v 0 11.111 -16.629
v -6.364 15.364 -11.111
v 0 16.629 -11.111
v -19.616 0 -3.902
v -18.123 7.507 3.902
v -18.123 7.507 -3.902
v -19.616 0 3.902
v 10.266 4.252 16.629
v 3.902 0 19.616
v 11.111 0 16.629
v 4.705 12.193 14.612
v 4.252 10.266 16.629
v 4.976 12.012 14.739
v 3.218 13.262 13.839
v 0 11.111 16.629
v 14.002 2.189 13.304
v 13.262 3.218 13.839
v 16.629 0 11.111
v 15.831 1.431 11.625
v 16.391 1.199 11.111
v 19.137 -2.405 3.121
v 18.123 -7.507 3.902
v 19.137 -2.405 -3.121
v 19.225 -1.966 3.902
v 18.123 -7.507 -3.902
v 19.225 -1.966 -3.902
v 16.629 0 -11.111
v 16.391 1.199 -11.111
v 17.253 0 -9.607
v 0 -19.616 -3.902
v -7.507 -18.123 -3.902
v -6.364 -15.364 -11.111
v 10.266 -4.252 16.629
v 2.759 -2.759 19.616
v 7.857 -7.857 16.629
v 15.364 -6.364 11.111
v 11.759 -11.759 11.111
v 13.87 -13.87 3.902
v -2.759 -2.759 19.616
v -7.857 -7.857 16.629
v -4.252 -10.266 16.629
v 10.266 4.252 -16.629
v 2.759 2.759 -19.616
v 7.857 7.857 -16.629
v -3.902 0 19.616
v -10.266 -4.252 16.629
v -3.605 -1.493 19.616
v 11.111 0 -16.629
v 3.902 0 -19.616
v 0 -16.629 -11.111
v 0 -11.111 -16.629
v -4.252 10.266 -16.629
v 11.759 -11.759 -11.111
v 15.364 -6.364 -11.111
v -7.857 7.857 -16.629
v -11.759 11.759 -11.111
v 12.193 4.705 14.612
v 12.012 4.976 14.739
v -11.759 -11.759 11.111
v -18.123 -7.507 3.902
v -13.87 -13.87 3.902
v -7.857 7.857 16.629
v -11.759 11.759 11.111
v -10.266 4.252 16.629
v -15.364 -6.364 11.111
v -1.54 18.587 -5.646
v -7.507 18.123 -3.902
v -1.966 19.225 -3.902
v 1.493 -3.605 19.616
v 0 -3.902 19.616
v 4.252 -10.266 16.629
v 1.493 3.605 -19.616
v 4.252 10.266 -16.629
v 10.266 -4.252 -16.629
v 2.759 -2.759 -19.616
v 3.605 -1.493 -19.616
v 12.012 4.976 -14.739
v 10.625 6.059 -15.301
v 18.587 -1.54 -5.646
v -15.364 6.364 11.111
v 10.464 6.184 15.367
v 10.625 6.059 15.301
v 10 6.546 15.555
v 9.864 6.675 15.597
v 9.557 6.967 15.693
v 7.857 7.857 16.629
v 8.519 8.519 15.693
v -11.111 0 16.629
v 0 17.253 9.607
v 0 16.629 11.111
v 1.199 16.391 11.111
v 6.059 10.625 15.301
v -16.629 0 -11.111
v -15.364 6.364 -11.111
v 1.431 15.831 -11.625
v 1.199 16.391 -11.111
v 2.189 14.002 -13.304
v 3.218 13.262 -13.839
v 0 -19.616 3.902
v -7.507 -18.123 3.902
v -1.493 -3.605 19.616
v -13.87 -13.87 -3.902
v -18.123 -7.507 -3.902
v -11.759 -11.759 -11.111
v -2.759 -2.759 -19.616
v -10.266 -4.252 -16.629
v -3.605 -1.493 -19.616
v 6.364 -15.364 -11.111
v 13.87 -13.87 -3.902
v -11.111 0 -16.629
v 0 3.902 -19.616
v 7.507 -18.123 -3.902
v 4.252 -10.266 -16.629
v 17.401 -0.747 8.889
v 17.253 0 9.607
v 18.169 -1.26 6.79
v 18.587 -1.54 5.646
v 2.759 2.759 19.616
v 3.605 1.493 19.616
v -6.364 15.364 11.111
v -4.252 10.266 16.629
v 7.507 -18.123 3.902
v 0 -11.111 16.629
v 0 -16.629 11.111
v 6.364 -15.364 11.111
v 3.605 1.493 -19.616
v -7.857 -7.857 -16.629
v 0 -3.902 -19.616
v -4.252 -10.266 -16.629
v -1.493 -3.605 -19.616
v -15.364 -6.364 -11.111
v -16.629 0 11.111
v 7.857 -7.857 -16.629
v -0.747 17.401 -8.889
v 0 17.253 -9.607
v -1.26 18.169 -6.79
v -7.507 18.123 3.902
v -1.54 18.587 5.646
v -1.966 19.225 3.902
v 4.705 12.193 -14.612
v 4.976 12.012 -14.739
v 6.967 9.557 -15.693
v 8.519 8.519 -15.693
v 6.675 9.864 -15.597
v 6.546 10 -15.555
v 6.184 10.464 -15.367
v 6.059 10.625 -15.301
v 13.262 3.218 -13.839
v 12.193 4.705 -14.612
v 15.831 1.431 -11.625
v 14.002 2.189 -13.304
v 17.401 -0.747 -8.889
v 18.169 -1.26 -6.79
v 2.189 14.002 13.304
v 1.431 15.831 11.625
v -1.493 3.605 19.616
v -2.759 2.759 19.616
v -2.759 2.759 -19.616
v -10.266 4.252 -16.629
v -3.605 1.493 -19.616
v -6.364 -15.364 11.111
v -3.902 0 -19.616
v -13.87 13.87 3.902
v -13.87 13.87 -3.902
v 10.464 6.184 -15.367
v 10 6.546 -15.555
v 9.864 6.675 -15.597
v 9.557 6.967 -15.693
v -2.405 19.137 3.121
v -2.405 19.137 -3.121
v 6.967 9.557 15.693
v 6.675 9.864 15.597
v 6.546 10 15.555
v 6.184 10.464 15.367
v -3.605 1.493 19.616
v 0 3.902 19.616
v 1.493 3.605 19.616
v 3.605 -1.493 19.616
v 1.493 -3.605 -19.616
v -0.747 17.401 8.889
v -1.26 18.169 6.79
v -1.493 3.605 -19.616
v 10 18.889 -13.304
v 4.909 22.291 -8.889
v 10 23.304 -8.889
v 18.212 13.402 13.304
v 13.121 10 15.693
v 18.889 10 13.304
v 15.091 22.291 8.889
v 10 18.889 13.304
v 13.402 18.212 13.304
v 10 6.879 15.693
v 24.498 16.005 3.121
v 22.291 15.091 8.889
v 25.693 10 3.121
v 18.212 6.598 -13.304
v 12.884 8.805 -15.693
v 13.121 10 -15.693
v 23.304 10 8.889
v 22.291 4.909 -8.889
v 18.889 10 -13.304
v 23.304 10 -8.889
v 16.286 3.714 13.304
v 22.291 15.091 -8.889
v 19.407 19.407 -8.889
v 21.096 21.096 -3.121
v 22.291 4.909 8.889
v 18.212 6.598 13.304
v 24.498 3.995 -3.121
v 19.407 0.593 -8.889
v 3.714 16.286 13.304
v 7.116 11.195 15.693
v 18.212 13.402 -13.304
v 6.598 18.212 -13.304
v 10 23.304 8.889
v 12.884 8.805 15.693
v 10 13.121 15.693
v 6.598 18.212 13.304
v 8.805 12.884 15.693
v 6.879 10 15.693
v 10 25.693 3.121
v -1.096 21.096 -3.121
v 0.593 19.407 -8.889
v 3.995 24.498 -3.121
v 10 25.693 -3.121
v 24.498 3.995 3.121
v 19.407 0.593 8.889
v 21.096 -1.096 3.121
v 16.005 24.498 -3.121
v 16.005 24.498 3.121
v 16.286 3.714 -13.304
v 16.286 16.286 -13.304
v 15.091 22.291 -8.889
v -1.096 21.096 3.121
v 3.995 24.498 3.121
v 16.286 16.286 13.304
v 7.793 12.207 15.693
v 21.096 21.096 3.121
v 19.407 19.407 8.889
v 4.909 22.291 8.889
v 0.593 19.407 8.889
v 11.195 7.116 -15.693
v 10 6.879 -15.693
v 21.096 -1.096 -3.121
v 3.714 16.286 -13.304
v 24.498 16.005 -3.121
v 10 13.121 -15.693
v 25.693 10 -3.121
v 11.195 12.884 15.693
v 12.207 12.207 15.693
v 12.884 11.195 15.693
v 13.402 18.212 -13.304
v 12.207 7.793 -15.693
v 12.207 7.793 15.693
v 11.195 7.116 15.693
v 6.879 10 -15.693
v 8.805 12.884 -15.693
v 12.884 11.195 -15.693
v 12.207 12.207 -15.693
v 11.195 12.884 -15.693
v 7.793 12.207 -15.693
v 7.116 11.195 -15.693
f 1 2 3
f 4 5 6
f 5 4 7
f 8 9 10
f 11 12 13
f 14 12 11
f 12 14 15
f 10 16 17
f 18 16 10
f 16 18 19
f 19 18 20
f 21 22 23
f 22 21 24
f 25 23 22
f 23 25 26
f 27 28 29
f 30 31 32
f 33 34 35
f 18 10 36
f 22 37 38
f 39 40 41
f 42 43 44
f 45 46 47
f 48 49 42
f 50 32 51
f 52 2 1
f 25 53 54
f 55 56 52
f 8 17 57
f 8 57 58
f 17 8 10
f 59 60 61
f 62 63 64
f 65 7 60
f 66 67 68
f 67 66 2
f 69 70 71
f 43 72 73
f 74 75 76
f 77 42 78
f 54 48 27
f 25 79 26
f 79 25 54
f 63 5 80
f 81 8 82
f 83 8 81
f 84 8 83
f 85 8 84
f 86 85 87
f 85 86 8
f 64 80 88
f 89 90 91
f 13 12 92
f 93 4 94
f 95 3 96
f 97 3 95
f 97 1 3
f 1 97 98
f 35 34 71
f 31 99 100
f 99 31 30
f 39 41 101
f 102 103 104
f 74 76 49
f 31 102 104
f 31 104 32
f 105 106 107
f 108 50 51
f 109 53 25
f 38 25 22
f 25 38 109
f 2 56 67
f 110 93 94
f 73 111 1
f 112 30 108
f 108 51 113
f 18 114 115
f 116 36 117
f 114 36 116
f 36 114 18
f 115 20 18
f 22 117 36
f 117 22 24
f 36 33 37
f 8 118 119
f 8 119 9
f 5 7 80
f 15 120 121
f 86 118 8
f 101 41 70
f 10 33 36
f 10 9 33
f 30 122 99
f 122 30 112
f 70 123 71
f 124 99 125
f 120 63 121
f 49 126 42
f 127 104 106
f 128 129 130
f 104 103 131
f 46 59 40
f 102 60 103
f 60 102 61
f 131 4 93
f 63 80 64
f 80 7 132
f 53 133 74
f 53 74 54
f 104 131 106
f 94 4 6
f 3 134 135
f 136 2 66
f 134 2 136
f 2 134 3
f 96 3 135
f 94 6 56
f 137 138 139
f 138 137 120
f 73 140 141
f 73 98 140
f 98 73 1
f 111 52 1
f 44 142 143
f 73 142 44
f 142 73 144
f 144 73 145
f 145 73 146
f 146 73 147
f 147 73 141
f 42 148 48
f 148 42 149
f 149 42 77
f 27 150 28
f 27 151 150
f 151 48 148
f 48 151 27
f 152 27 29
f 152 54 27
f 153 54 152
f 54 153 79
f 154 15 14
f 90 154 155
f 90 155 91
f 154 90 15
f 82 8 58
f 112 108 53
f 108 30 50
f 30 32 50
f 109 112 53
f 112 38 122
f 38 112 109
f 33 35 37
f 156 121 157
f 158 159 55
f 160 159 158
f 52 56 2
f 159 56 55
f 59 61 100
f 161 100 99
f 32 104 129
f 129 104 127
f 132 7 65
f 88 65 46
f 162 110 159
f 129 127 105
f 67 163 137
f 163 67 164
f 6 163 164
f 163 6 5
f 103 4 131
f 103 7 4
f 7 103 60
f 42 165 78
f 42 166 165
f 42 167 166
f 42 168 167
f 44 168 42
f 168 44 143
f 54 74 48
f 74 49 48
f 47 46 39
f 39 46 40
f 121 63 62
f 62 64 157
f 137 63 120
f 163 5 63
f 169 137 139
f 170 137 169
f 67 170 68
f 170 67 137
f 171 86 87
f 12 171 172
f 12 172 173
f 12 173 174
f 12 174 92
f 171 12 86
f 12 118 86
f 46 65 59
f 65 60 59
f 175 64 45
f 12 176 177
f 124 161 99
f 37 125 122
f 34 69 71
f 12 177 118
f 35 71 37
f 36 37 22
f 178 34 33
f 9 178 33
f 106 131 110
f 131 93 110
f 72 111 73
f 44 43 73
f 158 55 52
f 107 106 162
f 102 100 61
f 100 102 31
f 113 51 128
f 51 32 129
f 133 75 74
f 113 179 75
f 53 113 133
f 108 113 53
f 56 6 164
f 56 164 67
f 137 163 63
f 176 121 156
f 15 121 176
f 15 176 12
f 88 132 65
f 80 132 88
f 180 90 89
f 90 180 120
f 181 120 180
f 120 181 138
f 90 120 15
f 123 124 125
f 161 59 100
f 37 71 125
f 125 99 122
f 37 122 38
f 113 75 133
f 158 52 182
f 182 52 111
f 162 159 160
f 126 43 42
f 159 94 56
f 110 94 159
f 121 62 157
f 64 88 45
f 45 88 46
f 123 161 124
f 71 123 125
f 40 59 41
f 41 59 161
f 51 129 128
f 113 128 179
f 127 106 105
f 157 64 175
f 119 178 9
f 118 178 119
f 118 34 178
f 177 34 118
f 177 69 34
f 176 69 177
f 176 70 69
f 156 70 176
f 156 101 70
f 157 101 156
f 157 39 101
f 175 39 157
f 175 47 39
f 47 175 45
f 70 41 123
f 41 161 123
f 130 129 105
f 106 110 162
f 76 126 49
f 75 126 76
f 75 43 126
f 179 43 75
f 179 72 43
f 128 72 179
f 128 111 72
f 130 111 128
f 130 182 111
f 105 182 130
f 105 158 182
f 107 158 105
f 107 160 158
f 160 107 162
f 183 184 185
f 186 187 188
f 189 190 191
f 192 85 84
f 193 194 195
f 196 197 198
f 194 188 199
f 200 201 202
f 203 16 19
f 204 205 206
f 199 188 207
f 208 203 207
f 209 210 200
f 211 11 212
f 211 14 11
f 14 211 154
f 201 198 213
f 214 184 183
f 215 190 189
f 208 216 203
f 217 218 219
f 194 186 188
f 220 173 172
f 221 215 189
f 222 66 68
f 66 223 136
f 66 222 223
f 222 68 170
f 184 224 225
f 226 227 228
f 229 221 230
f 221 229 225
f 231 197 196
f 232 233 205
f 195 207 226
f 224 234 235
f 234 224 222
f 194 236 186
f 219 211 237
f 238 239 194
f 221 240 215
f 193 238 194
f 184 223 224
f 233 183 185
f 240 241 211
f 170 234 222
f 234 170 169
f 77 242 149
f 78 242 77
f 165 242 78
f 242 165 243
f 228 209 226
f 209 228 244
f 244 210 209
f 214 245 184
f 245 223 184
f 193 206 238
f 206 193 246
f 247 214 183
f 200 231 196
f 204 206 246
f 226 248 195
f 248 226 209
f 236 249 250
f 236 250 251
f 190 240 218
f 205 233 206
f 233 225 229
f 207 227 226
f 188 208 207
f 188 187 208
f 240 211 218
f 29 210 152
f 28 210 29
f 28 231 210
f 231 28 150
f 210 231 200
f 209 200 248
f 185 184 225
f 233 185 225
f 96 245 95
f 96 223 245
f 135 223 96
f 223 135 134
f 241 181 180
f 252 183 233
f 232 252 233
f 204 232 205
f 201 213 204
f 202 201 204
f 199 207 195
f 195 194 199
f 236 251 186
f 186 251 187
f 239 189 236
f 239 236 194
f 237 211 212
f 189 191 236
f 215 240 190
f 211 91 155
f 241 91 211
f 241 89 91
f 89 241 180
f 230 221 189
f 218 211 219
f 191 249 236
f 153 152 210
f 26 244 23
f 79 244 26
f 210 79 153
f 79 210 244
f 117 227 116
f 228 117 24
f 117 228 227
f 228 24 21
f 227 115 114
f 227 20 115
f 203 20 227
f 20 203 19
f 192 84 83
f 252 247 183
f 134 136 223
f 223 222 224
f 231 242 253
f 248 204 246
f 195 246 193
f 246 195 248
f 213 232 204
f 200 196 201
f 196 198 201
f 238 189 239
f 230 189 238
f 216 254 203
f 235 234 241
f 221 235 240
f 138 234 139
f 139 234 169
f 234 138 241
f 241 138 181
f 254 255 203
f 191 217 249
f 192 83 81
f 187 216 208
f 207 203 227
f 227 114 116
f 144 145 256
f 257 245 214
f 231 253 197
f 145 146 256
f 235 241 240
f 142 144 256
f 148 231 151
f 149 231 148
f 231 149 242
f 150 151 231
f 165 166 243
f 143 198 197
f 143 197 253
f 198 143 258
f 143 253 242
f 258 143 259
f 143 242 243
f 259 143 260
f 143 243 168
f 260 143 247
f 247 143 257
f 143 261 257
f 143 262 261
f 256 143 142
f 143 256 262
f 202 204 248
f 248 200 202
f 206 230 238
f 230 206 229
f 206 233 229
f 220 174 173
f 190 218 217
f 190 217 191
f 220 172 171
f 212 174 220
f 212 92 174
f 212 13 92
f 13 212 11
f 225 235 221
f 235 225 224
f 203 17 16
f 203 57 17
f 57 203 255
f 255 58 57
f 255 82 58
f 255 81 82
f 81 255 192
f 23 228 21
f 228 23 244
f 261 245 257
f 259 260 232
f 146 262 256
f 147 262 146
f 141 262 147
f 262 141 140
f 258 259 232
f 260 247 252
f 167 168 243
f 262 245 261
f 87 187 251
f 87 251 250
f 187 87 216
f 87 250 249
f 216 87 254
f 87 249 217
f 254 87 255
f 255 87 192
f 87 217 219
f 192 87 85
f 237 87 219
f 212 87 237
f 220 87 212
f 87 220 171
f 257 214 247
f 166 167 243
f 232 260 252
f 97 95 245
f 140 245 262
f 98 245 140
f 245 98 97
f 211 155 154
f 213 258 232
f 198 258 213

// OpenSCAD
$fn=16;
union() {
	sphere(r = 20);
	translate(v = [10, 10, 0])
		sphere(r = 16);
}
